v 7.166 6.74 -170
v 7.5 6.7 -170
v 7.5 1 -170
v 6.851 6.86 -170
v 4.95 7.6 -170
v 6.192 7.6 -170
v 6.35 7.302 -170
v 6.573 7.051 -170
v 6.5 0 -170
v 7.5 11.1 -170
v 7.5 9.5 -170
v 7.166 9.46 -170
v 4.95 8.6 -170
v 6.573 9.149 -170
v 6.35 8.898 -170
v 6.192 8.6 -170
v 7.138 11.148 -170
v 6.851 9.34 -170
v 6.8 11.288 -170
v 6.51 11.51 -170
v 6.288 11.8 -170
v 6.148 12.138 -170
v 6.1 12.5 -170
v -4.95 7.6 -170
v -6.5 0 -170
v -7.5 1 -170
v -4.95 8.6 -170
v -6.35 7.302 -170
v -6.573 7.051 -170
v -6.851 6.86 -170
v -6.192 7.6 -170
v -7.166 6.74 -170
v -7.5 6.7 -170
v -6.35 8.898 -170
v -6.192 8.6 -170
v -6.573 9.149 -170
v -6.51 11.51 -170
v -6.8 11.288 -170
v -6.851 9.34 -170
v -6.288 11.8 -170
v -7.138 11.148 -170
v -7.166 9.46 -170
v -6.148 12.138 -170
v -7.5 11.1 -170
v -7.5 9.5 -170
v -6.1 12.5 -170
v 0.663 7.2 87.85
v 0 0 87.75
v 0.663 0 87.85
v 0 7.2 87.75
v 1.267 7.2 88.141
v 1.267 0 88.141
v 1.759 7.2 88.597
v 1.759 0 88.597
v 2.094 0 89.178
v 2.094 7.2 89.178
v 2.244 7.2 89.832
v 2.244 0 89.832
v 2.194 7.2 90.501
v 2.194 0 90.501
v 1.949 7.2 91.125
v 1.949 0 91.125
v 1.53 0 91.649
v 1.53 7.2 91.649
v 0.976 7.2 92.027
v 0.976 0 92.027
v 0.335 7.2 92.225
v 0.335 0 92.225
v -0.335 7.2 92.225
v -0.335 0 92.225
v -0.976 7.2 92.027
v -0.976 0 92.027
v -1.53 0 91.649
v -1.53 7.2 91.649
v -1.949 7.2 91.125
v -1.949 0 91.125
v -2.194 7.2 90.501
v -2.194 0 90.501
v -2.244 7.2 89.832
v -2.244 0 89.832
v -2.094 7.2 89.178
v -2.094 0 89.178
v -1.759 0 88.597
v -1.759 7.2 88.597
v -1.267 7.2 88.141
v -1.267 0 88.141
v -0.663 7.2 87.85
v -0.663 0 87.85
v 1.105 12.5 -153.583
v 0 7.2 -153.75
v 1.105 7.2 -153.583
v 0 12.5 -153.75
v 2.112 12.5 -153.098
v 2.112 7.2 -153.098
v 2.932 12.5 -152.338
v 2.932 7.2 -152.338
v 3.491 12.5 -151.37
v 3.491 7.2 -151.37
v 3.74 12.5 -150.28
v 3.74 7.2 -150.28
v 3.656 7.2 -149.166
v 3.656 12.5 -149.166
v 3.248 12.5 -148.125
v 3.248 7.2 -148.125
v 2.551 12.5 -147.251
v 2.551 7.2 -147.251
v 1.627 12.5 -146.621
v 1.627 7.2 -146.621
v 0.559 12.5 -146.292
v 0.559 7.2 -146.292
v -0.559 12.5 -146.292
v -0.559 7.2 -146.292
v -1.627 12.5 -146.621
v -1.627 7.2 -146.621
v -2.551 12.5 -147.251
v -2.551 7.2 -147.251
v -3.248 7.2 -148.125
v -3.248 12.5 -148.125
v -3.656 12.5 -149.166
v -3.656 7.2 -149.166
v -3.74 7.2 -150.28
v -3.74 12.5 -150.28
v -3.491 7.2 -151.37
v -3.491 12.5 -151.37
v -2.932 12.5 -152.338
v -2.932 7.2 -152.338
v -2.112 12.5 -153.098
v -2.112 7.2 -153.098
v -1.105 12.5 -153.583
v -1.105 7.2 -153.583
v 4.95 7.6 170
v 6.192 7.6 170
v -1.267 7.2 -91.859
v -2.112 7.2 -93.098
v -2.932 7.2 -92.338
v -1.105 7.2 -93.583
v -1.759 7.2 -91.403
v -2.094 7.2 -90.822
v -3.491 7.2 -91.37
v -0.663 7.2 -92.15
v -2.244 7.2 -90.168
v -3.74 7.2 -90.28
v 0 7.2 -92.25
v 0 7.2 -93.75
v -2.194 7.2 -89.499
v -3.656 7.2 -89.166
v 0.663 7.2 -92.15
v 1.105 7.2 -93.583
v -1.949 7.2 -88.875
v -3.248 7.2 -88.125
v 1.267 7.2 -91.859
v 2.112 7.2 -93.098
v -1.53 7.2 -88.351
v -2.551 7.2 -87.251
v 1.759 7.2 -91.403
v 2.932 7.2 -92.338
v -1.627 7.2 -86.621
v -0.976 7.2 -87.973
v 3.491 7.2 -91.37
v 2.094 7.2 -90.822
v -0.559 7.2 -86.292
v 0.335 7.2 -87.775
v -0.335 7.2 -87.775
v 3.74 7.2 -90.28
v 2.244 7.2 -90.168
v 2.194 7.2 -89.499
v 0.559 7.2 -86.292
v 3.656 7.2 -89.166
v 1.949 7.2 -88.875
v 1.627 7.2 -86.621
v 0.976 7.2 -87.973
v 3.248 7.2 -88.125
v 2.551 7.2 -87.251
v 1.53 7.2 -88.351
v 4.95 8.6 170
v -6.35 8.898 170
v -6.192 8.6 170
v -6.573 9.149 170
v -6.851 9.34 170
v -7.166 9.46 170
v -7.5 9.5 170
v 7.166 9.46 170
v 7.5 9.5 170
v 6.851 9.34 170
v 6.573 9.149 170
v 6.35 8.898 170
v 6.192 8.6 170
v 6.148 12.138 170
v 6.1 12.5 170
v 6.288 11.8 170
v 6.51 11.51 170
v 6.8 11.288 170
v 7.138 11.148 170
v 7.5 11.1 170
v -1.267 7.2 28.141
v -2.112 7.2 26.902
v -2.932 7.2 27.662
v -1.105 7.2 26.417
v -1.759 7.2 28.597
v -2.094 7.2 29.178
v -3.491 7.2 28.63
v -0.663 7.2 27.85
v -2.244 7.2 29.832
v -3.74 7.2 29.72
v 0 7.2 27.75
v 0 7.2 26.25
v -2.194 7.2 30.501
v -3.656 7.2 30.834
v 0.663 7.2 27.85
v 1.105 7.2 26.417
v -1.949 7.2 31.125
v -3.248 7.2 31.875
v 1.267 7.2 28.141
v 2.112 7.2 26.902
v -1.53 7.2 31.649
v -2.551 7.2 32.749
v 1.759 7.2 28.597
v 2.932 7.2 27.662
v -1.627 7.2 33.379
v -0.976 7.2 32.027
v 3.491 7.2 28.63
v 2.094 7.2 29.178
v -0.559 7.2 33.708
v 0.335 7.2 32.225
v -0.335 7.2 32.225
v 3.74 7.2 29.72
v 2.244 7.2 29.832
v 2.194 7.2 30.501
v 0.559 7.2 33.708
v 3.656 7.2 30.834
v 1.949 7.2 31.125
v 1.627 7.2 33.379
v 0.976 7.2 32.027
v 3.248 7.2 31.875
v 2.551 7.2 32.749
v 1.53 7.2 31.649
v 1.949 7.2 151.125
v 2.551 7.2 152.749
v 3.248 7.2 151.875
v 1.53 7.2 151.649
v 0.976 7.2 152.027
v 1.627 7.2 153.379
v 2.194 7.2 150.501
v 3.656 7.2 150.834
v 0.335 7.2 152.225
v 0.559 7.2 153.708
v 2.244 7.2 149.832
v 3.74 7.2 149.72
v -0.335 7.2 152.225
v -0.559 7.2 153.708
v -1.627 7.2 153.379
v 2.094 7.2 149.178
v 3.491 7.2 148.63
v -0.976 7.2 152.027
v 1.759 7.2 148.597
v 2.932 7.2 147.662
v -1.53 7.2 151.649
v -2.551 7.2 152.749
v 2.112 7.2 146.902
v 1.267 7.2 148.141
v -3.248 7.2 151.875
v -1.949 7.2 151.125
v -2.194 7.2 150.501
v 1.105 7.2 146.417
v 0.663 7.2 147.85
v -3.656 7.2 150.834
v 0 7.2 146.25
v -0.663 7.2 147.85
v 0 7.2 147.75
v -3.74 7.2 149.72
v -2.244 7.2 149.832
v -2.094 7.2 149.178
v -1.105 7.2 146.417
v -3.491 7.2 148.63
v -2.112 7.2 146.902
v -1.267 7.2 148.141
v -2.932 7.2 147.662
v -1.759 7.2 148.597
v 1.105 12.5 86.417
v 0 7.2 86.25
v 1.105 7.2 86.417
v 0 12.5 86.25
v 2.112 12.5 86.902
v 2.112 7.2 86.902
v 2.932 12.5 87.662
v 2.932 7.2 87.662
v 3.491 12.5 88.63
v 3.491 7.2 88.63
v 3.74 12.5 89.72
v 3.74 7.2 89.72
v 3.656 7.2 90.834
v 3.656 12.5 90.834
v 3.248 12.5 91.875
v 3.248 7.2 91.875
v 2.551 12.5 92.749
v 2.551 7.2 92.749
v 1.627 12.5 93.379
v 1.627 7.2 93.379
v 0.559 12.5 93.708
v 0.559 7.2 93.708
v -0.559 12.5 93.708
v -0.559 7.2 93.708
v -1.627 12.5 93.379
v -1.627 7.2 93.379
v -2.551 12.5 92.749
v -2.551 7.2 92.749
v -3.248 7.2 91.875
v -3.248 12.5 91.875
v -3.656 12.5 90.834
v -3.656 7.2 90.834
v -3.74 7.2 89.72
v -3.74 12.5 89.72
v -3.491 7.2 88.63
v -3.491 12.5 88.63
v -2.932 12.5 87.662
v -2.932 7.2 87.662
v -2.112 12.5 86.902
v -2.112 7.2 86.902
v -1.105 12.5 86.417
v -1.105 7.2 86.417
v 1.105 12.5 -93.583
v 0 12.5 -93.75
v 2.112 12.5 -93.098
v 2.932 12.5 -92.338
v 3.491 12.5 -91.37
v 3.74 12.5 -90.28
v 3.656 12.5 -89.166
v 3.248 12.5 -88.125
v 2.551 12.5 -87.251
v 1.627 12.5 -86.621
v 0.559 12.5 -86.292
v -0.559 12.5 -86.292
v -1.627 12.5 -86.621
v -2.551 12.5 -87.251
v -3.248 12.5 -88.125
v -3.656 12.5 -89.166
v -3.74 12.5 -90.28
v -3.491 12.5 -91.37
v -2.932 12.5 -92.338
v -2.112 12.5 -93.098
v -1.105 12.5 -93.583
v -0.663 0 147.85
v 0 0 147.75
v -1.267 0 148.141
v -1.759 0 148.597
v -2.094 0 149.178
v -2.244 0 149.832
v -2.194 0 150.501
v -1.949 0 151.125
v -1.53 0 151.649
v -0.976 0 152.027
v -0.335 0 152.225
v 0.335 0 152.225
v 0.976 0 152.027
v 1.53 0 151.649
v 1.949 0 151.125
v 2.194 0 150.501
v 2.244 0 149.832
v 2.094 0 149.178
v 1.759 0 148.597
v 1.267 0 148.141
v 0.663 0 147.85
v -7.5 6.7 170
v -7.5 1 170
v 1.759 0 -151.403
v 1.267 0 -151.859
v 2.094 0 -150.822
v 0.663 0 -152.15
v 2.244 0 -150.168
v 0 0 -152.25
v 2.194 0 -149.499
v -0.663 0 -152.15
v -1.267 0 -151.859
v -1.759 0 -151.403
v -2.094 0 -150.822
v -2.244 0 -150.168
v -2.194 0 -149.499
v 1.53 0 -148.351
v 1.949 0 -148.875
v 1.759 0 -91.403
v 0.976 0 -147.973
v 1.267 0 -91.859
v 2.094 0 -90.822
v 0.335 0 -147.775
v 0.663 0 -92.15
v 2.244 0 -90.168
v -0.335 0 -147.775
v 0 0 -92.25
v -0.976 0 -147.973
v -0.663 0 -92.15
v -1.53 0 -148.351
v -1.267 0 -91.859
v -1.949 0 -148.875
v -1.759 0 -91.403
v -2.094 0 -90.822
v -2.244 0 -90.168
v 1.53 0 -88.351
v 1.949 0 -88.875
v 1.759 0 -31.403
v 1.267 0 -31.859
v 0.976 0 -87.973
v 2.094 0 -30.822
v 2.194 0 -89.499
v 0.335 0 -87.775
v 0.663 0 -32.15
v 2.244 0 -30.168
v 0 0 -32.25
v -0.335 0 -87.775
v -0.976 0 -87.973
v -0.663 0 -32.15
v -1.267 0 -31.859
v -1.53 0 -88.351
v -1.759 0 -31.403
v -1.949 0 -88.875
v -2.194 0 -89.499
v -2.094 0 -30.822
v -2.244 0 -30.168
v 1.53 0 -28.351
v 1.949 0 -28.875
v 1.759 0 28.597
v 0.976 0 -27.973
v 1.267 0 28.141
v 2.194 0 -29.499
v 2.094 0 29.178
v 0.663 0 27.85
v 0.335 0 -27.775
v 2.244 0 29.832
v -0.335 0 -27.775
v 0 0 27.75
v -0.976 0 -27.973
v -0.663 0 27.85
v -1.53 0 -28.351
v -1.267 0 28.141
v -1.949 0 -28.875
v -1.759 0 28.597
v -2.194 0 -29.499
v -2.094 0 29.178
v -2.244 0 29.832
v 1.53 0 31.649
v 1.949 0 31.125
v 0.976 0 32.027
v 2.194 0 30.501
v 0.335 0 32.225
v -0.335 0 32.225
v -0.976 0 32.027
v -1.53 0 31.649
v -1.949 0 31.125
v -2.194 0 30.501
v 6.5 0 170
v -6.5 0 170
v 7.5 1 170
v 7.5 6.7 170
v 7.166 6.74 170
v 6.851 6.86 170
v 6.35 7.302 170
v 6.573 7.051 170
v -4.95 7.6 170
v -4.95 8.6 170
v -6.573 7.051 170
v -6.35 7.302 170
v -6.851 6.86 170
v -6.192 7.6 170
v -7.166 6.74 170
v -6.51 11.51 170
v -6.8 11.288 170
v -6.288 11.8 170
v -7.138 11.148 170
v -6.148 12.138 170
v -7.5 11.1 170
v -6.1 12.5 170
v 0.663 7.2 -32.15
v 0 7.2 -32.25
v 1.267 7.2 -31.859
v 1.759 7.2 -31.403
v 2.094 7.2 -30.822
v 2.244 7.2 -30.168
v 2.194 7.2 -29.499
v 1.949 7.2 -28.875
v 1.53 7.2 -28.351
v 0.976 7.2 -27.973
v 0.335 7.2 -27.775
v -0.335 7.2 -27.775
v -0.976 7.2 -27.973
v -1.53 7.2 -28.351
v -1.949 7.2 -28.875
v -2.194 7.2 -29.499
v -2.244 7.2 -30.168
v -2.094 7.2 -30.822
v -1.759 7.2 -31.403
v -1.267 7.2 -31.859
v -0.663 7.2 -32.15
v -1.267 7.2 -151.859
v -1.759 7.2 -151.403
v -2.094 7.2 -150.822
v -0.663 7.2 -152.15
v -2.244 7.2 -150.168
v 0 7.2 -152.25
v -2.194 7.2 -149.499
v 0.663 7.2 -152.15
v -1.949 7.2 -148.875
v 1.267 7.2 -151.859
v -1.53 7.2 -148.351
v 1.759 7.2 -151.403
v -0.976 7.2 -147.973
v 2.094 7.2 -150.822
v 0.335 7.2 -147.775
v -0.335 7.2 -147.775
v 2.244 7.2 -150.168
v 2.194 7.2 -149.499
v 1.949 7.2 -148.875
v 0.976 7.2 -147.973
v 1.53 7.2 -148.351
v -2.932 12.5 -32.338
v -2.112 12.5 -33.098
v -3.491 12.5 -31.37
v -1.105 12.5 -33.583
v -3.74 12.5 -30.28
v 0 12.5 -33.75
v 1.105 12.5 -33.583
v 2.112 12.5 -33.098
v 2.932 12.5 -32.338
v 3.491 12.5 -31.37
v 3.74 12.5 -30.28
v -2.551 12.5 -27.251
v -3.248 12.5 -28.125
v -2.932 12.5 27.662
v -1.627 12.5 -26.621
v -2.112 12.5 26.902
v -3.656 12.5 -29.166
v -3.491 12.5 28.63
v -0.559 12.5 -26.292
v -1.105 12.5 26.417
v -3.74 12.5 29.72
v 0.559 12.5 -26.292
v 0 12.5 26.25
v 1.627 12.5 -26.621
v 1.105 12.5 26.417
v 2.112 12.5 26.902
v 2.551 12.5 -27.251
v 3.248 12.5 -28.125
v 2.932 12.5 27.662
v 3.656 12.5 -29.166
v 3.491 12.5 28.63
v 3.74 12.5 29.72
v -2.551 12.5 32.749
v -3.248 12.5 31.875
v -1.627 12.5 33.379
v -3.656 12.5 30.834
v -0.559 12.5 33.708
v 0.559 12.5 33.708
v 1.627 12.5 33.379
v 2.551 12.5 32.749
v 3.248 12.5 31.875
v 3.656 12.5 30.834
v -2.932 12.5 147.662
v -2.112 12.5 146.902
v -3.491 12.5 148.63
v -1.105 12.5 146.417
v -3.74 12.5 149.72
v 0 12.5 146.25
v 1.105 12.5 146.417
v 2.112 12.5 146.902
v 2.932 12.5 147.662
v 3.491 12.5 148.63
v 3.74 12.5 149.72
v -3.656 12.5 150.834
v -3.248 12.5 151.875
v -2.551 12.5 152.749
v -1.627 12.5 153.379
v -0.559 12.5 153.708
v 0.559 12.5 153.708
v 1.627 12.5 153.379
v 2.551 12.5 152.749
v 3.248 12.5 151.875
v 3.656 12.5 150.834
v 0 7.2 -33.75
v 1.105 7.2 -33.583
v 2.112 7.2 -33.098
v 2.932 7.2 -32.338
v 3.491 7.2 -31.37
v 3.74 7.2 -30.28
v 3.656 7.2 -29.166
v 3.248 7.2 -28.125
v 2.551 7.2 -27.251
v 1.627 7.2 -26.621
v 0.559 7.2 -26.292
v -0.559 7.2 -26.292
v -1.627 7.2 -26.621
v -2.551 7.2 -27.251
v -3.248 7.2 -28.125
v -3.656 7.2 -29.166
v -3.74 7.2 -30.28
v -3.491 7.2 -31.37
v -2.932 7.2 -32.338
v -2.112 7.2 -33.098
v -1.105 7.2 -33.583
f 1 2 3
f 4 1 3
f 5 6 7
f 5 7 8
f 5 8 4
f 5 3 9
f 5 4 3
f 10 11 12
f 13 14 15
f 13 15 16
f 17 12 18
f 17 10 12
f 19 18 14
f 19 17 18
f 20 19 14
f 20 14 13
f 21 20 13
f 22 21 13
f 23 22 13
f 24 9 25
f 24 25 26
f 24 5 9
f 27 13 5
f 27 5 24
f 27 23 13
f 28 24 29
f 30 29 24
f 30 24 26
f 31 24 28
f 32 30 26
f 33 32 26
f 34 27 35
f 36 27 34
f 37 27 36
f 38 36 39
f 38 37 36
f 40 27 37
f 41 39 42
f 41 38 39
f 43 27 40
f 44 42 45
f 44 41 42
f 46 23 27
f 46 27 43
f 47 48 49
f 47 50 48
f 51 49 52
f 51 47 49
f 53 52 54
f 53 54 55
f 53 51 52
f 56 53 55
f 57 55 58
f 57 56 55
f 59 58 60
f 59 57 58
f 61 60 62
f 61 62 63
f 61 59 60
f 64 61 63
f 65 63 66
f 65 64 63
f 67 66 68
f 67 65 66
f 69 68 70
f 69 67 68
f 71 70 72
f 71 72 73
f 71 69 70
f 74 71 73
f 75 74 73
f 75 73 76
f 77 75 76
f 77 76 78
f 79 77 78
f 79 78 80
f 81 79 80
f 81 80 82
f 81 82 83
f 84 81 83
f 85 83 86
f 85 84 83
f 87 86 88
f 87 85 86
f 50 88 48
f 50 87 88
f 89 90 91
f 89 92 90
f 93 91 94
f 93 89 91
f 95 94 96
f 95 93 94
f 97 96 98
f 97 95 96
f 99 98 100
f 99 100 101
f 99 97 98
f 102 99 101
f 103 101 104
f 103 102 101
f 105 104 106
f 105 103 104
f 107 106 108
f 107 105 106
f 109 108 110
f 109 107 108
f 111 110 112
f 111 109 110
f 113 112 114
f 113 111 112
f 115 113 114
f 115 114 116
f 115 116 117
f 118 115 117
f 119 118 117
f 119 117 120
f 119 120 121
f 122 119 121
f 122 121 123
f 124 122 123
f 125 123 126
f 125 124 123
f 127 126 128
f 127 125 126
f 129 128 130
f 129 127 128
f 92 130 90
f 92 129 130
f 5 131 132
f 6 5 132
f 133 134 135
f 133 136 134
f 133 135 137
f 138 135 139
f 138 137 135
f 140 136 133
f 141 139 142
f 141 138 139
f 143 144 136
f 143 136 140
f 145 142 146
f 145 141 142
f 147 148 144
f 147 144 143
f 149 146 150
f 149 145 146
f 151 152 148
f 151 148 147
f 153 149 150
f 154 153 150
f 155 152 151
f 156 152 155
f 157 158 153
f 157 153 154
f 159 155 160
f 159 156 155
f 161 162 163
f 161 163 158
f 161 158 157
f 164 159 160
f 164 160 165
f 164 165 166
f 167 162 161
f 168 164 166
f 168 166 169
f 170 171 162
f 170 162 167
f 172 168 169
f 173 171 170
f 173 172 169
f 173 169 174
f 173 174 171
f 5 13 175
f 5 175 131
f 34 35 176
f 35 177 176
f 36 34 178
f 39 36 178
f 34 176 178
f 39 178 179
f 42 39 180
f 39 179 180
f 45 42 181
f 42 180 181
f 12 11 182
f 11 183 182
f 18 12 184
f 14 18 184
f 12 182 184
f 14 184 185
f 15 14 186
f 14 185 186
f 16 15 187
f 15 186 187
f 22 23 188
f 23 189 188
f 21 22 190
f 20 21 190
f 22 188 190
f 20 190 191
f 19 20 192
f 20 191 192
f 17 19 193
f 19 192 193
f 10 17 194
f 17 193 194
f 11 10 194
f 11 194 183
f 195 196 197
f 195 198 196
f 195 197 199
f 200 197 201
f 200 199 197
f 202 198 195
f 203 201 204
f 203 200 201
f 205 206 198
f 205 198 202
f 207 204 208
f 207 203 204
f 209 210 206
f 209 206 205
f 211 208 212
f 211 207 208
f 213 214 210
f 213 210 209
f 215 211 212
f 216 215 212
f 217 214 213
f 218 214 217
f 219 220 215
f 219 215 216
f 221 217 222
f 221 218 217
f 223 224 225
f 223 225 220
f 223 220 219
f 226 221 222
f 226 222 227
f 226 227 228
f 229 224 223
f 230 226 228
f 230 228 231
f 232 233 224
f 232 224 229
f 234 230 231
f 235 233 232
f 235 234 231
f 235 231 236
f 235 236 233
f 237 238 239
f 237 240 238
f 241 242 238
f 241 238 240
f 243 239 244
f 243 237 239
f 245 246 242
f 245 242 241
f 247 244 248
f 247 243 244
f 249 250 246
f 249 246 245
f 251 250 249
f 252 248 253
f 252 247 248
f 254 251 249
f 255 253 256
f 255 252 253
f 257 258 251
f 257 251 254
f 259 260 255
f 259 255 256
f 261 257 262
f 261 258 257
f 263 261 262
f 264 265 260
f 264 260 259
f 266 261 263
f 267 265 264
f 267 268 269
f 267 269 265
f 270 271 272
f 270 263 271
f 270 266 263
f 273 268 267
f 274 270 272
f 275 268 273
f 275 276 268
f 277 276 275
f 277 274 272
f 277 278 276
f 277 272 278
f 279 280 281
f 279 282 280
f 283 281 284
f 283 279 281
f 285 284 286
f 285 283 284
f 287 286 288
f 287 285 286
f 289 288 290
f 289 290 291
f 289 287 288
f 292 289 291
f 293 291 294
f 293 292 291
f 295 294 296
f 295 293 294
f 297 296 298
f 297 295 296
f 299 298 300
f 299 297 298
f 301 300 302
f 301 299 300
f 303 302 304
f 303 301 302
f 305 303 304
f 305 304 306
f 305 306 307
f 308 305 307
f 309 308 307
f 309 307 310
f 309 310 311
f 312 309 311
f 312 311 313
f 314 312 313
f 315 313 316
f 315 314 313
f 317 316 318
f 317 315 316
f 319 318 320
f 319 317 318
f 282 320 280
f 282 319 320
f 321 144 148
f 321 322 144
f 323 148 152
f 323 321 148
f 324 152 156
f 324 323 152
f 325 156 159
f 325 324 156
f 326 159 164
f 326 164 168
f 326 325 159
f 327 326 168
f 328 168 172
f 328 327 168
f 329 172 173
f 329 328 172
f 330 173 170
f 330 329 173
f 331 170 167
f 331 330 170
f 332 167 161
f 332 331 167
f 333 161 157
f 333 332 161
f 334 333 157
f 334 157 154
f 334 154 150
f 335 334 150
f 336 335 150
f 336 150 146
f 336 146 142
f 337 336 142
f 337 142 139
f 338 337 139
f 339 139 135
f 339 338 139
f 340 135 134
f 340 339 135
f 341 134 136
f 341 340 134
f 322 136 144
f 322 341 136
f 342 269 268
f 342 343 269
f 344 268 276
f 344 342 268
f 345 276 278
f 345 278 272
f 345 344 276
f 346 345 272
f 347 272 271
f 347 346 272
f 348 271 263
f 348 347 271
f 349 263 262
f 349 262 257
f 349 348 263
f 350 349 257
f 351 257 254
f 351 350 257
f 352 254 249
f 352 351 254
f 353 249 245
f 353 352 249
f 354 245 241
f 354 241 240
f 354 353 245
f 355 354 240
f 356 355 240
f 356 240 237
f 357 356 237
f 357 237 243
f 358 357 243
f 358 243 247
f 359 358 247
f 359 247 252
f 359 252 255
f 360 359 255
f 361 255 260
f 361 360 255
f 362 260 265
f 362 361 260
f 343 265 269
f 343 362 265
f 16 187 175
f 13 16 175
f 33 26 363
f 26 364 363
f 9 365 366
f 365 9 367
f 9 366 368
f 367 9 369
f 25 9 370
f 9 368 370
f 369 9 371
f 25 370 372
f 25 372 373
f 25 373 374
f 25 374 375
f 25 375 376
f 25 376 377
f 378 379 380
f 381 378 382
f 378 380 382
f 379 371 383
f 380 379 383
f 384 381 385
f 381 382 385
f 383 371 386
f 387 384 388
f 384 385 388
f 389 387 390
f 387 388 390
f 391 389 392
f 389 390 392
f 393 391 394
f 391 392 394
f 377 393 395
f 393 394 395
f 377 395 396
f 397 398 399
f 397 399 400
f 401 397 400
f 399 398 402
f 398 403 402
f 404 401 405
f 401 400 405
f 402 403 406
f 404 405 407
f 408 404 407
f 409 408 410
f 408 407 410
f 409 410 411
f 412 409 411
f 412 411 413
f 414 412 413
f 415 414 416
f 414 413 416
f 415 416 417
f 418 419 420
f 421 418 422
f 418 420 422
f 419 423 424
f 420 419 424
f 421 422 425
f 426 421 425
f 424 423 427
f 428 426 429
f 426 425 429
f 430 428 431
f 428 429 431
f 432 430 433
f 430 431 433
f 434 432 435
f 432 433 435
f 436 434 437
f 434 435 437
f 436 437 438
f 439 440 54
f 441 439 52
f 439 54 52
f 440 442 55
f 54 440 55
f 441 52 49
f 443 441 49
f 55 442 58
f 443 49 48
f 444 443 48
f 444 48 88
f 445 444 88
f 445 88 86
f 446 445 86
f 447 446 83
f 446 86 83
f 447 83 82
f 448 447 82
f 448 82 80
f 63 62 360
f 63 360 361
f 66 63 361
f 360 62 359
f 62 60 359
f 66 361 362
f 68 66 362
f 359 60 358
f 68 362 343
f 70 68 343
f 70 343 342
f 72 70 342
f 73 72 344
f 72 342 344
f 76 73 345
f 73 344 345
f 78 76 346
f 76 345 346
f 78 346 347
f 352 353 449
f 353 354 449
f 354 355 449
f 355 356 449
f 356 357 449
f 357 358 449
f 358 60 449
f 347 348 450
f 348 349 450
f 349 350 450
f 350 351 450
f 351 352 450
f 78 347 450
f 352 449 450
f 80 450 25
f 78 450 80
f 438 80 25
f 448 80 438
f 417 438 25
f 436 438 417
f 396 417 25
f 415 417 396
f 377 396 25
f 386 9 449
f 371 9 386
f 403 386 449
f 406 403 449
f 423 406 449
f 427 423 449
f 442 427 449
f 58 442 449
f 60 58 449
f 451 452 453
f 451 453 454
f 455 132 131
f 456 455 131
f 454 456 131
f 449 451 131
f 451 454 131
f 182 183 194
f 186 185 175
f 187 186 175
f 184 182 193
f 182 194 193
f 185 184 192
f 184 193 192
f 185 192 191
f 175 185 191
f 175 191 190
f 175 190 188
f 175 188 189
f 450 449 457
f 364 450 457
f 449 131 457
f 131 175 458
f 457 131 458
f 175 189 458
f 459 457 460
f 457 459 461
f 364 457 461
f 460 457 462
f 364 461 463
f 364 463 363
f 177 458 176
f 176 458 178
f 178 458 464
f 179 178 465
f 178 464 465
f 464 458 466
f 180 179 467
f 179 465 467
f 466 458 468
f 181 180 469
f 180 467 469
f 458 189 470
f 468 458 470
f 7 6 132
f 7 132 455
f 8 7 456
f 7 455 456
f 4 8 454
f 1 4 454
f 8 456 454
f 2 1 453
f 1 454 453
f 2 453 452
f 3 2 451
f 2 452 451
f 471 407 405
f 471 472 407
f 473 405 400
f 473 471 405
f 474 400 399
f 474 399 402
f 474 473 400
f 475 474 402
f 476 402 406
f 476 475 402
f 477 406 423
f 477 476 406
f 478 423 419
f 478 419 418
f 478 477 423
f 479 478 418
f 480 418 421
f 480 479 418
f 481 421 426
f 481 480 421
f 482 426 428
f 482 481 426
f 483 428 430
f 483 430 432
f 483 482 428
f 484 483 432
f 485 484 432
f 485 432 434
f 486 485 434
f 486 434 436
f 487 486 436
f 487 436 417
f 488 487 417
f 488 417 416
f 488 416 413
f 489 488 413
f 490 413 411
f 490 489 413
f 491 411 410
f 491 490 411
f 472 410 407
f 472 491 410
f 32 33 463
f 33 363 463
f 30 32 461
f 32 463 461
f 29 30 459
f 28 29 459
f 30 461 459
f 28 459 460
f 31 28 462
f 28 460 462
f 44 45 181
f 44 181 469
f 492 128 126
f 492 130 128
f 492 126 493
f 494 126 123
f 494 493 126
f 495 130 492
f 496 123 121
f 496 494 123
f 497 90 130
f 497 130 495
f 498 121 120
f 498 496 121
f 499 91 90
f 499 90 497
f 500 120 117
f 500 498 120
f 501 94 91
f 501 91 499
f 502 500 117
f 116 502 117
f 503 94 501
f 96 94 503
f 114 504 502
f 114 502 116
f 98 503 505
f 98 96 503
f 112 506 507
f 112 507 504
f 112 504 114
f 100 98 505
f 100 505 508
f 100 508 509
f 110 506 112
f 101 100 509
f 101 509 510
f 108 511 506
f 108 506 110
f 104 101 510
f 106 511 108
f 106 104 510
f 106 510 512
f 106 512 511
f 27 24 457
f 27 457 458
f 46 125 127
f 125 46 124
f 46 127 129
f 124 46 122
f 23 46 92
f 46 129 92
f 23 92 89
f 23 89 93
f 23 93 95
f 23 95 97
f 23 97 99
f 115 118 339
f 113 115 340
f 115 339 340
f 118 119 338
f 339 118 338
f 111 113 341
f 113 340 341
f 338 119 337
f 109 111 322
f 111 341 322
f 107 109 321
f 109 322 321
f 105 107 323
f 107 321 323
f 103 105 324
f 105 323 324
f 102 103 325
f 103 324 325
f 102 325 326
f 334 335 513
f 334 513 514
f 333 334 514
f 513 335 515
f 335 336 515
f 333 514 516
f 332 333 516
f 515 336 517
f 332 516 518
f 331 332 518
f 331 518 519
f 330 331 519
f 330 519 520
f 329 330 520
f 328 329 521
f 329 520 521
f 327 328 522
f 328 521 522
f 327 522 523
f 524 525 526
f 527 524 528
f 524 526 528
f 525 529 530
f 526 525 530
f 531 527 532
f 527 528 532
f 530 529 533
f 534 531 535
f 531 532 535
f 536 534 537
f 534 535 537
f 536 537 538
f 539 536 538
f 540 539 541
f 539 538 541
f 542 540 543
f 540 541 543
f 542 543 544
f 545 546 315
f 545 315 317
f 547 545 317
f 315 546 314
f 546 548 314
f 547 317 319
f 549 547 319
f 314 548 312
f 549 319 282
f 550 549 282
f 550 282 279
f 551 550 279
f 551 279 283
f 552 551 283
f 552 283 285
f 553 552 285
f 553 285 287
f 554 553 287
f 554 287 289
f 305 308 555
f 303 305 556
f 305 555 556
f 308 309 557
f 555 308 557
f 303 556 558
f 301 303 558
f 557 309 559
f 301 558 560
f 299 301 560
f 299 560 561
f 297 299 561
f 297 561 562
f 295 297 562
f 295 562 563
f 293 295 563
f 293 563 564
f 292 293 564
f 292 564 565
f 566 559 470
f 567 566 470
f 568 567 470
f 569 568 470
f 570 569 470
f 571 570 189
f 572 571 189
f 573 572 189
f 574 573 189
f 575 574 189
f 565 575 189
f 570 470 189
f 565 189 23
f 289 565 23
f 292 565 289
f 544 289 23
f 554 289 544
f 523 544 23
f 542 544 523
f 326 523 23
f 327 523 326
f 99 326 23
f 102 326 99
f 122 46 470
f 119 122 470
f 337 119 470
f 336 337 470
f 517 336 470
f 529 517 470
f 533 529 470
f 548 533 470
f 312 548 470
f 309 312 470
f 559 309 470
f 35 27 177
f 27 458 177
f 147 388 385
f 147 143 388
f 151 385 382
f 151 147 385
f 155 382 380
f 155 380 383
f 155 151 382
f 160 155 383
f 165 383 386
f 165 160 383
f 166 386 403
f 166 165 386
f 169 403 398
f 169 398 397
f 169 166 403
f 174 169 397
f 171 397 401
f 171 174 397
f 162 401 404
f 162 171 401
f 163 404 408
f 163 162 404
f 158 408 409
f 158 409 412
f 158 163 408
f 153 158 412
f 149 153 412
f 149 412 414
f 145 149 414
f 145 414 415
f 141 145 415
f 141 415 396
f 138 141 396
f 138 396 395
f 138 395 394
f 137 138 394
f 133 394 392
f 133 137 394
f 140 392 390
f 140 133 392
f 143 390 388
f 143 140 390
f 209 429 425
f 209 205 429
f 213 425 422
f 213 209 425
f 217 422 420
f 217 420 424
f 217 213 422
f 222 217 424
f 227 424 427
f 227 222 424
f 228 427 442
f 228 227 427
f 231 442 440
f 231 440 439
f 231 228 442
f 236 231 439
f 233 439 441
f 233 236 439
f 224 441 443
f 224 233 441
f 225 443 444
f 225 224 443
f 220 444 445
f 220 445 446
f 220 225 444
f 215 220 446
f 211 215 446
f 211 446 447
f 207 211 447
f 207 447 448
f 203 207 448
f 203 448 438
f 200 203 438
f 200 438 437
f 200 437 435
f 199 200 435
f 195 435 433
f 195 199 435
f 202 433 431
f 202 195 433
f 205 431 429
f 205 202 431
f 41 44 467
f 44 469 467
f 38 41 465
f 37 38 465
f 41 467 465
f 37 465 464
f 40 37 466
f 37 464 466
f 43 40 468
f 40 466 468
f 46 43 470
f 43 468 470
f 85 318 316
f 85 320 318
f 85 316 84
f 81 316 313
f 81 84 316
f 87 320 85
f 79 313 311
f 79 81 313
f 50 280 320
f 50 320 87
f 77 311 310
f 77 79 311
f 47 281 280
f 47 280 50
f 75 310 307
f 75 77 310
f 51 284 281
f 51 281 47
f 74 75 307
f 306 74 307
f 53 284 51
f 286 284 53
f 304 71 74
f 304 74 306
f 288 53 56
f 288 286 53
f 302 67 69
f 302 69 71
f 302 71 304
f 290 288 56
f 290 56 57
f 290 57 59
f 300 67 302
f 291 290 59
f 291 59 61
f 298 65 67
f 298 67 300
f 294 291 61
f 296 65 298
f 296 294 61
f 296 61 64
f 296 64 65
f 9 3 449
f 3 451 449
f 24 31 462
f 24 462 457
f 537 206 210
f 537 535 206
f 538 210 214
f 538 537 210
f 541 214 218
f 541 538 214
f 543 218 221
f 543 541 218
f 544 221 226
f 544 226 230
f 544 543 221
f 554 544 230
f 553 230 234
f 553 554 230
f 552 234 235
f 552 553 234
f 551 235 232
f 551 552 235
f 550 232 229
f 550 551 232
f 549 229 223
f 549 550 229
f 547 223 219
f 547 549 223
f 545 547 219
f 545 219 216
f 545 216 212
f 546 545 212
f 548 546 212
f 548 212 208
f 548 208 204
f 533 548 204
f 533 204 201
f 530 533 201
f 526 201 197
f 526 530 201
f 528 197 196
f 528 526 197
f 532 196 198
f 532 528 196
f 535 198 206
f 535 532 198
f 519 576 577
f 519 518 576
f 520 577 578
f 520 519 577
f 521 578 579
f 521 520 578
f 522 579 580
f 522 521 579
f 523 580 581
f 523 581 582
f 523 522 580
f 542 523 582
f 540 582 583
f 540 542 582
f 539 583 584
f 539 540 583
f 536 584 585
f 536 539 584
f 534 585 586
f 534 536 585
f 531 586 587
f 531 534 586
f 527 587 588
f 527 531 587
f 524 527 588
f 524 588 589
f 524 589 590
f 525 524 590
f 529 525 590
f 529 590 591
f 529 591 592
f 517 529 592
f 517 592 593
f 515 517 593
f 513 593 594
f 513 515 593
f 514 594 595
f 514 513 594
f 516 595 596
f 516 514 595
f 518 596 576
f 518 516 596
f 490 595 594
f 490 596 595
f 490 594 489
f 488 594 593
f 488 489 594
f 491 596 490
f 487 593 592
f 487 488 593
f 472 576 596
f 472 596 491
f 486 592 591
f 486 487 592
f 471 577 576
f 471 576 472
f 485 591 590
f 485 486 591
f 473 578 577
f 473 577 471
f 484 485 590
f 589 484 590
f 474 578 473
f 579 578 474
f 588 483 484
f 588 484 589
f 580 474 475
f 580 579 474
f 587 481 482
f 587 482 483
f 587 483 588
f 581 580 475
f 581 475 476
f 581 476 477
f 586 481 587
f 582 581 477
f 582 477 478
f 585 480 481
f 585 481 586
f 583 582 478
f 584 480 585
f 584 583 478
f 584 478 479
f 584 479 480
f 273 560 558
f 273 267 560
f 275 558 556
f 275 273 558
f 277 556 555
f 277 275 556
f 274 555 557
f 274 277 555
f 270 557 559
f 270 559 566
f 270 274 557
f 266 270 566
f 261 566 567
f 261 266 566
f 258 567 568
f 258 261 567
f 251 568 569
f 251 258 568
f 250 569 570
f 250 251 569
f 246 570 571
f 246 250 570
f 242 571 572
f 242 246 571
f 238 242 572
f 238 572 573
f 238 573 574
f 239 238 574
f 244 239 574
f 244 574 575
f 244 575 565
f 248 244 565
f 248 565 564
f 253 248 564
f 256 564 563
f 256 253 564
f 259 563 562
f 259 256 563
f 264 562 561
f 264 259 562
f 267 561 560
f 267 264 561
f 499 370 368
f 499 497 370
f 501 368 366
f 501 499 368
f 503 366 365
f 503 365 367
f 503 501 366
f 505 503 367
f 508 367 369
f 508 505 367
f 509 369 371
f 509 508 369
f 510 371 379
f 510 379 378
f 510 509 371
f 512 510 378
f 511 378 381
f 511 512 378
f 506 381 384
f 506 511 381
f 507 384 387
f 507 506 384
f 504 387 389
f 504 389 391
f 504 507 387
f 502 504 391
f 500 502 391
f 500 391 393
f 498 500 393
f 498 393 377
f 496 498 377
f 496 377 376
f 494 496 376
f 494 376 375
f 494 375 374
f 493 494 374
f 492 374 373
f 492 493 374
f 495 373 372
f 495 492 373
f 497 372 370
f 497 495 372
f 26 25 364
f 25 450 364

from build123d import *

# Parameters (mm, degrees)
EXTRUDE1_DEPTH  = 170
LPATTERN1_COUNT = 5
LPATTERN1_PITCH = 60


with BuildPart() as part:
    # 15mm → Extrude1 (new, symmetric)
    with BuildSketch(Plane.XY):
        with BuildLine():
            Line((4.949972, 7.600006), (6.192321846, 7.599996))
            ThreePointArc((6.192321846, 7.599996), (6.706266371, 6.946742527), (7.49999, 6.7))
            Line((7.49999, 6.7), (7.49999, 1.000024142))
            Line((7.49999, 1.000024142), (6.499965858, 0))
            Line((6.499965858, 0), (-6.499965858, 0))
            Line((-6.499965858, 0), (-7.49999, 1.000024142))
            Line((-7.49999, 1.000024142), (-7.49999, 6.7))
            ThreePointArc((-7.49999, 6.7), (-6.70626637, 6.946742527), (-6.192321846, 7.599996))
            Line((-6.192321846, 7.599996), (-4.949982, 7.599996))
            Line((-4.949982, 7.599996), (-4.949972, 8.600006))
            Line((-4.949972, 8.600006), (-6.192326435, 8.600016))
            ThreePointArc((-6.192326435, 8.600016), (-6.706271662, 9.253261115), (-7.49999, 9.5))
            Line((-7.49999, 9.5), (-7.49999, 11.099974))
            ThreePointArc((-7.49999, 11.099974), (-6.510037425, 11.510033031), (-6.099989, 12.49999))
            Line((-6.099989, 12.49999), (6.099989, 12.49999))
            ThreePointArc((6.099989, 12.49999), (6.510037425, 11.510033031), (7.49999, 11.099974))
            Line((7.49999, 11.099974), (7.49999, 9.5))
            ThreePointArc((7.49999, 9.5), (6.706271662, 9.253261115), (6.192326435, 8.600016))
            Line((6.192326435, 8.600016), (4.949982, 8.600016))
            Line((4.949982, 8.600016), (4.949972, 7.600006))
        make_face()
    extrude(amount=EXTRUDE1_DEPTH, both=True)

    # Sketch1 → Cut-Revolve1 (revolve, cut)
    with BuildSketch(Plane(origin=(0, 0, 0), x_dir=(0, 0, -1), z_dir=(1, 0, 0))):
        Polygon((-150, 12.49999), (-146.25, 12.49999), (-146.25, 7.19999), (-147.75, 7.19999), (-147.75, 0), (-150, 0), align=None)
    revolve(axis=Axis((0, 0, 150), (0, 1, 0)), mode=Mode.SUBTRACT)

    # Sketch2 → Cut-Revolve2 (revolve, cut)
    with BuildSketch(Plane(origin=(0, 0, 0), x_dir=(0, 0, -1), z_dir=(1, 0, 0))):
        Polygon((150, 0), (152.25, 0), (152.25, 7.19999), (153.75, 7.19999), (153.75, 12.49999), (150, 12.49999), align=None)
    cut_revolve2 = revolve(axis=Axis((0, 12.49999, -150), (0, -1, 0)), mode=Mode.SUBTRACT)

    # LPattern1: Cut-Revolve2 ×5
    with Locations(*[(0, 0, i * LPATTERN1_PITCH) for i in range(1, LPATTERN1_COUNT)]):
        add(cut_revolve2, mode=Mode.SUBTRACT)


solid = part.part
